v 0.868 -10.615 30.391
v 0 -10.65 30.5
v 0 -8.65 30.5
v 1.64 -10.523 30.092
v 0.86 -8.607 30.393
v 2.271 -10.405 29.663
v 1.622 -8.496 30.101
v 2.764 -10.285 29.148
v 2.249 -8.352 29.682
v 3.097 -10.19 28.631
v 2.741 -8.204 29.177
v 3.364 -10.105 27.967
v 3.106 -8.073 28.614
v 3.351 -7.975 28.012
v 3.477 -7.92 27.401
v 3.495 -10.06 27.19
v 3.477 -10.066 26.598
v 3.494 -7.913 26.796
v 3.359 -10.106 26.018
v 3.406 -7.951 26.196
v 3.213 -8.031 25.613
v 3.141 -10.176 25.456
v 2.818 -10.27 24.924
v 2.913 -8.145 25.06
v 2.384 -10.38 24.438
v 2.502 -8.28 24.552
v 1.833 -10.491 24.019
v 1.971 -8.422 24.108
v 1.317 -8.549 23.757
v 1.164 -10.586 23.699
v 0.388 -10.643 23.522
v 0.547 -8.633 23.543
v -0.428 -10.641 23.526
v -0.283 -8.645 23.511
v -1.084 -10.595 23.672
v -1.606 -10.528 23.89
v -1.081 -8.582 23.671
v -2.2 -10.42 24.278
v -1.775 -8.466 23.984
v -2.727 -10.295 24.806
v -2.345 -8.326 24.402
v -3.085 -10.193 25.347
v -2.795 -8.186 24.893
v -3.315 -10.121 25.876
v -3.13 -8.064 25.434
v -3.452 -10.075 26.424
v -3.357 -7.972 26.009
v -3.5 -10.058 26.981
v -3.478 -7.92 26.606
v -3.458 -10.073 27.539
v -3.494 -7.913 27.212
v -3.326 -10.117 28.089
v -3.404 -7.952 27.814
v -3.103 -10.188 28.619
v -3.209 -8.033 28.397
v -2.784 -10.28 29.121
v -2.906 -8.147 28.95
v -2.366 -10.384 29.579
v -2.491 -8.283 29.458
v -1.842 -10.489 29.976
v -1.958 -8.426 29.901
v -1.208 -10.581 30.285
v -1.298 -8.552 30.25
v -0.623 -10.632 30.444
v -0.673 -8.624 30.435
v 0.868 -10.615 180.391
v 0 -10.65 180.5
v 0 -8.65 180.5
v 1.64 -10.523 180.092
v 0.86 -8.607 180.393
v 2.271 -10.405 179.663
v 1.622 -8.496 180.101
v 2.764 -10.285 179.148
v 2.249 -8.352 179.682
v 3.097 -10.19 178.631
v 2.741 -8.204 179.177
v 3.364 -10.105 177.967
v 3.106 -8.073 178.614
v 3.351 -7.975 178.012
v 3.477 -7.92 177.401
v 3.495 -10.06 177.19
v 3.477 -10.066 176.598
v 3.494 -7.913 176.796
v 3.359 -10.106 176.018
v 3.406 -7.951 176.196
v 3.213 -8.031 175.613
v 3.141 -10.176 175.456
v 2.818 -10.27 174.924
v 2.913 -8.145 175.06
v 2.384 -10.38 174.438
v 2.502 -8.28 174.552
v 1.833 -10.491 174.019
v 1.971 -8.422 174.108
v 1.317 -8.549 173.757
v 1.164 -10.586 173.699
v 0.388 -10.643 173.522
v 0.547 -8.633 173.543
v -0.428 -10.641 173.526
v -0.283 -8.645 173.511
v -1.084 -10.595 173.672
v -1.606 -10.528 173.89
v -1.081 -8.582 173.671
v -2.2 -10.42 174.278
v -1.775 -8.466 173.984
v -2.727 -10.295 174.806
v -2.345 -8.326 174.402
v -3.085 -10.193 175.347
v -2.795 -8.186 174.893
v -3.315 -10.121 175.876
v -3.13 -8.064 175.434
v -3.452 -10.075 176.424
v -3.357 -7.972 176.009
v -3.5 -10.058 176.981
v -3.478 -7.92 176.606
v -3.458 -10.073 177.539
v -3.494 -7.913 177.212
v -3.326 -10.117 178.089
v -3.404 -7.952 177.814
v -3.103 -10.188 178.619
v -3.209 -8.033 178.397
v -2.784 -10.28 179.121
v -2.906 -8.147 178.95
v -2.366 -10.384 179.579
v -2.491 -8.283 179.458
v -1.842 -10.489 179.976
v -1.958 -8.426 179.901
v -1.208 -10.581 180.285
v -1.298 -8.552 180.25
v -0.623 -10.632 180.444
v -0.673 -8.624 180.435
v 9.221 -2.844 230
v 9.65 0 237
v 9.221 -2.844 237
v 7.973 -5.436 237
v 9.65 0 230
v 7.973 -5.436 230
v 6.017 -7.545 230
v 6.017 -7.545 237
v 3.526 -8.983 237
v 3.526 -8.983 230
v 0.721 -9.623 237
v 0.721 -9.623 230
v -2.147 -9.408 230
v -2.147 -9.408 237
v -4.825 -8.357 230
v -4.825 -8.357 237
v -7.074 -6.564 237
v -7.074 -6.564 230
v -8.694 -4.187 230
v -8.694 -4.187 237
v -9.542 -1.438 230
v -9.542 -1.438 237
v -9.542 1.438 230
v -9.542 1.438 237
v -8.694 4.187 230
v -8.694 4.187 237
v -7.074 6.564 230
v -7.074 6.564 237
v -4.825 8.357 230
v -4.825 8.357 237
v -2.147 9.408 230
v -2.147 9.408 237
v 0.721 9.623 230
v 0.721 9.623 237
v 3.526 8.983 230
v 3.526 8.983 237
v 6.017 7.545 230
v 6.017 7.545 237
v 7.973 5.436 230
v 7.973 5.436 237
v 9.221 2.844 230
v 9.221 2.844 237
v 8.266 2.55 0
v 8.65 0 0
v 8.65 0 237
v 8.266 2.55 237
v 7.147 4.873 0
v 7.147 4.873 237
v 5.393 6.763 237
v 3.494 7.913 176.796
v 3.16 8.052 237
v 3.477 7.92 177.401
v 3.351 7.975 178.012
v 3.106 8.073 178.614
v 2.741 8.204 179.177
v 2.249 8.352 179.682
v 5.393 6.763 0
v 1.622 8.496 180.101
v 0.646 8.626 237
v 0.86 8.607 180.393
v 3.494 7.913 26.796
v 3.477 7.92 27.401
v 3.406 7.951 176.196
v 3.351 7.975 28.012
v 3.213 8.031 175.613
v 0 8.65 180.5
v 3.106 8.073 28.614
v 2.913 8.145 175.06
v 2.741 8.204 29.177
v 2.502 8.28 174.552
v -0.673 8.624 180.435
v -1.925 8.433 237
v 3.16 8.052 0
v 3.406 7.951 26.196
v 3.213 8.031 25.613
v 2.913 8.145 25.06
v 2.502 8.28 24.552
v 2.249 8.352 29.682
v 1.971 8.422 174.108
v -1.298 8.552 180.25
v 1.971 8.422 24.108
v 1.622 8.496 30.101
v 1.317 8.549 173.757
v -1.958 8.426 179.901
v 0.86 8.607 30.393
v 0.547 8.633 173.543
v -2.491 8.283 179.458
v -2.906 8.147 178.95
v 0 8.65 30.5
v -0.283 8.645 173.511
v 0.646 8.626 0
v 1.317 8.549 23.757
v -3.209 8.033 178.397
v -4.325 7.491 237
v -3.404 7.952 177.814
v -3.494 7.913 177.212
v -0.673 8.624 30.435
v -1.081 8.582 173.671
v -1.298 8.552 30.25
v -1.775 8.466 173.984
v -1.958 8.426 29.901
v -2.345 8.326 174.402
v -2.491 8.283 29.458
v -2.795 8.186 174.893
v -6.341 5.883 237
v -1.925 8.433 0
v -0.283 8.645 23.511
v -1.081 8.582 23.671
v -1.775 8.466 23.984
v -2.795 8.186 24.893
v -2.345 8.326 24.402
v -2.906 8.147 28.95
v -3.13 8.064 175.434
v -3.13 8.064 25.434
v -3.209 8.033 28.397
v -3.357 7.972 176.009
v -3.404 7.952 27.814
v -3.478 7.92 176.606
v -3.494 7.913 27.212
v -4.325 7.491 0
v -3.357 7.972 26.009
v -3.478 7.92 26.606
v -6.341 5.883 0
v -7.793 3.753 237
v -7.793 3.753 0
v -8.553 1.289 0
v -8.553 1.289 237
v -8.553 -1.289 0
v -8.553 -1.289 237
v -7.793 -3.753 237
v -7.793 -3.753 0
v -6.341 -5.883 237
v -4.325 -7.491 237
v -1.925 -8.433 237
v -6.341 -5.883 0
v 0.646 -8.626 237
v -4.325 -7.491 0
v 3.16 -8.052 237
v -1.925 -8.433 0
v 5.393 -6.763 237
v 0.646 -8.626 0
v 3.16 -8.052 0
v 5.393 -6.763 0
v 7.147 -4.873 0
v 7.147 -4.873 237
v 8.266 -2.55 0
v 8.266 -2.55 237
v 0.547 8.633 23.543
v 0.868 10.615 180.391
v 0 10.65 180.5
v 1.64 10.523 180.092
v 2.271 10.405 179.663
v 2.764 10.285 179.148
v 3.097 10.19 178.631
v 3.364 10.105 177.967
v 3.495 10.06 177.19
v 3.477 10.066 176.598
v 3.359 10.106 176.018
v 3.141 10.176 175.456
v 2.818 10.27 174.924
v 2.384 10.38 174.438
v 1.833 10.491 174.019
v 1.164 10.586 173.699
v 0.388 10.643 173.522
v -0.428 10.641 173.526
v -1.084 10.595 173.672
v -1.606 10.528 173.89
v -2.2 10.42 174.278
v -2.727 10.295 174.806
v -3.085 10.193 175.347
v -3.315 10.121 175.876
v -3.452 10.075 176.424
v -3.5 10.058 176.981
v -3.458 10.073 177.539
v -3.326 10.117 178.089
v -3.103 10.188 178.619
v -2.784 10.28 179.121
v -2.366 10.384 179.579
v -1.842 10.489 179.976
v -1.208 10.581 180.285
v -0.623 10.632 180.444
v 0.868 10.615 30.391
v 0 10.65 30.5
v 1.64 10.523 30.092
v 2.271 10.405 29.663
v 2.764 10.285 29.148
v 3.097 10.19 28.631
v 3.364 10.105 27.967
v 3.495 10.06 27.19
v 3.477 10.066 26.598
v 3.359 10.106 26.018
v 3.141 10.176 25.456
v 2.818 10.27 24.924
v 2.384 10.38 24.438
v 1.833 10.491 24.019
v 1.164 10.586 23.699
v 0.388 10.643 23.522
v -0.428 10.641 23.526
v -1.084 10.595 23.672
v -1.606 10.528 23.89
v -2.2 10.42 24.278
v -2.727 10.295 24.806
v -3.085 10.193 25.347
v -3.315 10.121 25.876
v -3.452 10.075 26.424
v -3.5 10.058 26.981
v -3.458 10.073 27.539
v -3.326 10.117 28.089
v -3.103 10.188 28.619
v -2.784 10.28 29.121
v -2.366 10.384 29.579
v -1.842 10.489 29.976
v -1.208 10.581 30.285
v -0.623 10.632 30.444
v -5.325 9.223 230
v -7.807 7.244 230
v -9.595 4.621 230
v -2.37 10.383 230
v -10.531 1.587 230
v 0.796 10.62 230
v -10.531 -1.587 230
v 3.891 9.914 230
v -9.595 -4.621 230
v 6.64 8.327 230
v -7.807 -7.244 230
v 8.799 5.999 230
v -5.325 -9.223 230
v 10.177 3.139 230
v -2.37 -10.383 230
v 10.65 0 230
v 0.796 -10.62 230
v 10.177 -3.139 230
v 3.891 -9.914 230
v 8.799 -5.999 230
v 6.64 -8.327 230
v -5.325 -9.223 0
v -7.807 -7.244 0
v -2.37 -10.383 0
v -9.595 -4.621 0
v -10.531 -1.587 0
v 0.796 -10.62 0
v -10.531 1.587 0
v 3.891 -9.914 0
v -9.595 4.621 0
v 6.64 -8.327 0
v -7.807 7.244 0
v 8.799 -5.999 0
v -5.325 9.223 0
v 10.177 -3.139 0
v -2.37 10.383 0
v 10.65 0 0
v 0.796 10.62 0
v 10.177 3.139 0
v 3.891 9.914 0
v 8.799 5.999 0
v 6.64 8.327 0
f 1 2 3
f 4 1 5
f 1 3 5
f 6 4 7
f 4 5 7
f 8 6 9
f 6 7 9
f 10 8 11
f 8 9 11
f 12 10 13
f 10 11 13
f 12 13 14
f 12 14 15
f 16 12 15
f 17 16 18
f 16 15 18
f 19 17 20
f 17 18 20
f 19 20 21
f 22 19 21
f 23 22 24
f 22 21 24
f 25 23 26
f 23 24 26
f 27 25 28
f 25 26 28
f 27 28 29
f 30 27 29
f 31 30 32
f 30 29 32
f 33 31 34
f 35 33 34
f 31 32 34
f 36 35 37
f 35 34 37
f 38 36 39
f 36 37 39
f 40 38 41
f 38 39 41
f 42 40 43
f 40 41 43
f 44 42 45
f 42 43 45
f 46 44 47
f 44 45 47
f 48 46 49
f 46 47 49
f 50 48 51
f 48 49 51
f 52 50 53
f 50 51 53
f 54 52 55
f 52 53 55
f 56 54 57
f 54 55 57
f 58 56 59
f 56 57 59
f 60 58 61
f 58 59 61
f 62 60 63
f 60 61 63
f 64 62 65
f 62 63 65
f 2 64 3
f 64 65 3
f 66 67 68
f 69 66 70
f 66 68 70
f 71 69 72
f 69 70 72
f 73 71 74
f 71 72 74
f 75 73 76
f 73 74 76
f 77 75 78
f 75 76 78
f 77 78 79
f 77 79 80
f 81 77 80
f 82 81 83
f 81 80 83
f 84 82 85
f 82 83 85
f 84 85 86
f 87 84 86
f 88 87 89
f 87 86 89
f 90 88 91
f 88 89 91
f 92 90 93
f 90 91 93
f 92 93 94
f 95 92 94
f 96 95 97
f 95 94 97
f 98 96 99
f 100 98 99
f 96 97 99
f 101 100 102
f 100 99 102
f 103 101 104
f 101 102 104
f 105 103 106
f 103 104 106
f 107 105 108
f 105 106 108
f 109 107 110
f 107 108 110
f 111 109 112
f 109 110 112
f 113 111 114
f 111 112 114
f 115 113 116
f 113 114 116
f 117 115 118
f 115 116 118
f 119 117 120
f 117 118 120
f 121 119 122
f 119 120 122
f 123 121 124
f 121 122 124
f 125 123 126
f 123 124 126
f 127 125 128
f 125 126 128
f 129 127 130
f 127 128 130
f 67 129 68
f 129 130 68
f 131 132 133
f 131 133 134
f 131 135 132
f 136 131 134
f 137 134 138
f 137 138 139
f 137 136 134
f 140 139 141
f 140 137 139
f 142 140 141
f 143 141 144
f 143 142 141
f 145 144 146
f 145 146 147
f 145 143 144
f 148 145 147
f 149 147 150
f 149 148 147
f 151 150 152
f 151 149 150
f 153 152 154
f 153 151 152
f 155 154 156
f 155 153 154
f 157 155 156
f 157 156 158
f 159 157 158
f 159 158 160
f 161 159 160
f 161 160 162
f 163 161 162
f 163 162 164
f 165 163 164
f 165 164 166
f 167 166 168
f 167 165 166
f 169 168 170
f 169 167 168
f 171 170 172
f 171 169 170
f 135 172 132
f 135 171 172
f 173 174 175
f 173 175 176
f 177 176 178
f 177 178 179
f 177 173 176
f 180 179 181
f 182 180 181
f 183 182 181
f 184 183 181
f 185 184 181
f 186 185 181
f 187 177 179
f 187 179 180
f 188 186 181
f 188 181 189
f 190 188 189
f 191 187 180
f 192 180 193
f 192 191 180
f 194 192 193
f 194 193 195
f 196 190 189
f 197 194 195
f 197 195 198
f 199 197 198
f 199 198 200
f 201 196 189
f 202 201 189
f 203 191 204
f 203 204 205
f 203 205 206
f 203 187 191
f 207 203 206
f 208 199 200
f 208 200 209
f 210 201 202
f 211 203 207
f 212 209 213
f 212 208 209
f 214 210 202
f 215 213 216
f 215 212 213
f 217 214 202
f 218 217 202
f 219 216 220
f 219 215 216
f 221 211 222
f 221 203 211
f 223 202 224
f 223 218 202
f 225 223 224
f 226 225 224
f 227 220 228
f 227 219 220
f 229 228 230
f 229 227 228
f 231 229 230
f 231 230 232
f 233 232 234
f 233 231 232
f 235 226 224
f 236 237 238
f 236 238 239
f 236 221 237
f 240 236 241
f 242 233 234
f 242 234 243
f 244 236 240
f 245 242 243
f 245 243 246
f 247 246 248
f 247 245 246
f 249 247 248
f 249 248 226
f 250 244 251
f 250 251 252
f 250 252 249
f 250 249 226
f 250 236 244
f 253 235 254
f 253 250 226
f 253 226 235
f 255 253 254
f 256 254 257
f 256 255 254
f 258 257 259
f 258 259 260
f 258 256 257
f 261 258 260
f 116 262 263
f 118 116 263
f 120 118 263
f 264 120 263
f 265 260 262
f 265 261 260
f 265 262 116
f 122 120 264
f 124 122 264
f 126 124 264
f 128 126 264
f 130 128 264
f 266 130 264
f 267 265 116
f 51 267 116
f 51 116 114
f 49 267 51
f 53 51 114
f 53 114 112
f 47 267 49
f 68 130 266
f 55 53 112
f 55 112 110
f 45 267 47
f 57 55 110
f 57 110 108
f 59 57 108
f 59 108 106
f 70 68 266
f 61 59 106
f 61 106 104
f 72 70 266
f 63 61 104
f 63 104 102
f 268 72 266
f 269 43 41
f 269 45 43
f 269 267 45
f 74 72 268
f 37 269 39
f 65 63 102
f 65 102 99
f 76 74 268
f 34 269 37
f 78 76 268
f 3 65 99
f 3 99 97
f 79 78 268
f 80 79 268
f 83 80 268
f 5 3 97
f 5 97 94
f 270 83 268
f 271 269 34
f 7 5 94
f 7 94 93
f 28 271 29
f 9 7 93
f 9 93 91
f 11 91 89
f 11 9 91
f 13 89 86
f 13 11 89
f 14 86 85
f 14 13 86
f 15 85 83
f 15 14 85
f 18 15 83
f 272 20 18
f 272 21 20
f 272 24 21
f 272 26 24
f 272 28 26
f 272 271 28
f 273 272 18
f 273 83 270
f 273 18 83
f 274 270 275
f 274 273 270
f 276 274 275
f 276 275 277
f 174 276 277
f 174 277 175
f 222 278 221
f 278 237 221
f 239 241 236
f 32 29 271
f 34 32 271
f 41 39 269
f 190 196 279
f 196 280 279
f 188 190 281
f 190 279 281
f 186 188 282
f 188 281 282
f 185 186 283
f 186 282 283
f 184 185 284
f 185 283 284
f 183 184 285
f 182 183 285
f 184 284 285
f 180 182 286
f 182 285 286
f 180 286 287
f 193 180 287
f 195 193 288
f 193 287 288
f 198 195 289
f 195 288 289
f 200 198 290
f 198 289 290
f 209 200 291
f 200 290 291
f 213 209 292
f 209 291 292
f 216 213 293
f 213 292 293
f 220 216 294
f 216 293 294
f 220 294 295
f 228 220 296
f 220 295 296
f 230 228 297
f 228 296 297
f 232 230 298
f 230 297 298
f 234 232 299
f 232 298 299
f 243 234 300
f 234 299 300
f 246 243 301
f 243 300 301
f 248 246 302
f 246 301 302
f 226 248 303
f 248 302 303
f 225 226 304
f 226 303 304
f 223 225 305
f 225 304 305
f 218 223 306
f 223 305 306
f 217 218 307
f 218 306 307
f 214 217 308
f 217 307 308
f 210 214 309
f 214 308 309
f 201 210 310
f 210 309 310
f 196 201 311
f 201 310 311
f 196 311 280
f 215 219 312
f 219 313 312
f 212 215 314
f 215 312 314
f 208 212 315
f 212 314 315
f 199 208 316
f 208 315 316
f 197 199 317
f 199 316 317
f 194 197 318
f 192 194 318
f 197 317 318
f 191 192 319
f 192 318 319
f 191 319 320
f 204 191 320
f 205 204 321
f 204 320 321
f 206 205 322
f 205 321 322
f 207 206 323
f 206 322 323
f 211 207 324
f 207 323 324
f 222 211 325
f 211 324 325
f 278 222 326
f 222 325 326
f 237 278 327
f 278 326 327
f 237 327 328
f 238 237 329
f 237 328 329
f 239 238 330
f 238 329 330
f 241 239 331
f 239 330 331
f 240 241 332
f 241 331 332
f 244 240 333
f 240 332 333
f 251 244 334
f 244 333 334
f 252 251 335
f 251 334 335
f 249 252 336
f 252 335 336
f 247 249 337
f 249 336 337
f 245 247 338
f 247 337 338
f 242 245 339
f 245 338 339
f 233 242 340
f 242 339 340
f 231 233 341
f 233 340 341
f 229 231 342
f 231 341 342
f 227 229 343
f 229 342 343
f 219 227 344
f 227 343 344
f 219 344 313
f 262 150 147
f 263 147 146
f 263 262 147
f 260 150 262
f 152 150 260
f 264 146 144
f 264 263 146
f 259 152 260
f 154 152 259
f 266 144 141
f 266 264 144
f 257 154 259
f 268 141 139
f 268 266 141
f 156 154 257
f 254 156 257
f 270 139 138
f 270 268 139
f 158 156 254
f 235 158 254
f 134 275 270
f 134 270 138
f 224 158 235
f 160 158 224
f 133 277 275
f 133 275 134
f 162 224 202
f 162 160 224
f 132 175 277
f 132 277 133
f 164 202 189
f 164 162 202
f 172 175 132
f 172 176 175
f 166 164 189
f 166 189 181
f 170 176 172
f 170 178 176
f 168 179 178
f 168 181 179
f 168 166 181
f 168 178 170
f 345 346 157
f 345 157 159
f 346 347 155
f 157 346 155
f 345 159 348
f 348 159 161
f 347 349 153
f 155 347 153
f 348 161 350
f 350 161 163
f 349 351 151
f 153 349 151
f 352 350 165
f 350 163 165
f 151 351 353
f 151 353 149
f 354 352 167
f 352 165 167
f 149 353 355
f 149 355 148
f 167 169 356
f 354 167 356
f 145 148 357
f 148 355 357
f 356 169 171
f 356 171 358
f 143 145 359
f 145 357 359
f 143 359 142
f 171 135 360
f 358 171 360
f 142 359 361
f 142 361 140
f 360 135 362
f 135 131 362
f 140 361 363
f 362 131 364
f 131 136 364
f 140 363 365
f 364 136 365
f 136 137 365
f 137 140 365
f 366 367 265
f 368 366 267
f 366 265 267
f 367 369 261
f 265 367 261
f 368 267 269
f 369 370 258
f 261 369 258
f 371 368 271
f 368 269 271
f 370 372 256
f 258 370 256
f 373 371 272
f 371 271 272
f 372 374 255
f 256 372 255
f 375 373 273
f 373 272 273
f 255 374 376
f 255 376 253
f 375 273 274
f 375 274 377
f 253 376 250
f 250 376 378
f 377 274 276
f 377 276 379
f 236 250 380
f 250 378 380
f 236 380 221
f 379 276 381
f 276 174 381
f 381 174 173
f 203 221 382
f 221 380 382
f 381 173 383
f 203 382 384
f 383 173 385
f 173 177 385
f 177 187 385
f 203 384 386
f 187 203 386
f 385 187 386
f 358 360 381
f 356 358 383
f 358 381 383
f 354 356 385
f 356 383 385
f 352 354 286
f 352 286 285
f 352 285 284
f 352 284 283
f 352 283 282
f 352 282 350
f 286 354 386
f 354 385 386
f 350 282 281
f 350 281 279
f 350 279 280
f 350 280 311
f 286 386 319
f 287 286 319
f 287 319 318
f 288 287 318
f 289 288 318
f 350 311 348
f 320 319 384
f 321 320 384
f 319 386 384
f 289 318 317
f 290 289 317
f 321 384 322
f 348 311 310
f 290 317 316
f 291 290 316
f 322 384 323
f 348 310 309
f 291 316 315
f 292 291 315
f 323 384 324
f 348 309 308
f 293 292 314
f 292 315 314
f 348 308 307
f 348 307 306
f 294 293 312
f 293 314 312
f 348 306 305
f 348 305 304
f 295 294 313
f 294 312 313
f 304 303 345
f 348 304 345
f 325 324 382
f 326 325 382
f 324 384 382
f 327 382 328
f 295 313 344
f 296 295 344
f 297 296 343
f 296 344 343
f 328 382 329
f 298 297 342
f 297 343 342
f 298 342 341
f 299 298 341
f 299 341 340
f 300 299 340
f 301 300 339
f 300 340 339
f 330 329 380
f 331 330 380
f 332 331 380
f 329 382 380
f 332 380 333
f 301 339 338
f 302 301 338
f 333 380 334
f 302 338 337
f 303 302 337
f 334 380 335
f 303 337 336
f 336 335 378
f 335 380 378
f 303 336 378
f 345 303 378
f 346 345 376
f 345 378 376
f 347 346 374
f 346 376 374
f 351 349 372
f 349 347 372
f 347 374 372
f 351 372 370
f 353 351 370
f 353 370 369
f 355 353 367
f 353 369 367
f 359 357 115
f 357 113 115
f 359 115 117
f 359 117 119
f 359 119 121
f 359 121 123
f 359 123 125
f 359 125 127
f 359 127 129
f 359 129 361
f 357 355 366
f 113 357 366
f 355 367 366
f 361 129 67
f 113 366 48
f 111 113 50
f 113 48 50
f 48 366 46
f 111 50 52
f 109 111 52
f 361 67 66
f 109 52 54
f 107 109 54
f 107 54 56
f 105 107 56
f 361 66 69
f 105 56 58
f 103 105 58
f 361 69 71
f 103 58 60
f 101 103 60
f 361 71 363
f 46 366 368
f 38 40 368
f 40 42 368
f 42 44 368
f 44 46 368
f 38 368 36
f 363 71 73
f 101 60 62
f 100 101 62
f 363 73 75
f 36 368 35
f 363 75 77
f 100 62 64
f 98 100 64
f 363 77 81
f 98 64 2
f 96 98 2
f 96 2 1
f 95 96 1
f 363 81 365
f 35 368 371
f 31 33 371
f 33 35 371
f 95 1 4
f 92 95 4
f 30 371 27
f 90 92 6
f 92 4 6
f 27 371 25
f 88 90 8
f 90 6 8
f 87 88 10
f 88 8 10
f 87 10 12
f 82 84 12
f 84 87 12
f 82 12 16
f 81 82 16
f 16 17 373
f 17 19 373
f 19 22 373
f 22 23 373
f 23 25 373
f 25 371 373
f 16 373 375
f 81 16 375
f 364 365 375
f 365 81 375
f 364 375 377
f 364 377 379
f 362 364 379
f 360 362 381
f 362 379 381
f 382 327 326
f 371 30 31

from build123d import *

# Parameters (mm, degrees)
SKETCH1_R           = 10.65
SKETCH1_R_2         = 8.65
BOSS_EXTRUDE1_DEPTH = 237
SKETCH2_R           = 3.5
CUT_EXTRUDE1_DEPTH  = 238.478093727
LPATTERN1_COUNT     = 2
LPATTERN1_PITCH     = 150
SKETCH3_W           = 1
SKETCH3_H           = 7


with BuildPart() as part:
    # Sketch1 → Boss-Extrude1 (new body)
    with BuildSketch(Plane.XY):
        Circle(SKETCH1_R)
        Circle(SKETCH1_R_2, mode=Mode.SUBTRACT)
    extrude(amount=BOSS_EXTRUDE1_DEPTH)

    # Sketch2 → Cut-Extrude1 (cut, symmetric)
    with BuildSketch(Plane(origin=(0, 0, 0), x_dir=(1, 0, 0), z_dir=(0, 1, 0))):
        with Locations(Location((0, -177, 0), (0, 0, 270))):
            Circle(SKETCH2_R)
    cut_extrude1 = extrude(amount=CUT_EXTRUDE1_DEPTH, both=True, mode=Mode.SUBTRACT)

    # LPattern1: Cut-Extrude1 ×2
    with Locations(*[(0, 0, -i * LPATTERN1_PITCH) for i in range(1, LPATTERN1_COUNT)]):
        add(cut_extrude1, mode=Mode.SUBTRACT)

    # Sketch3 → Cut-Revolve1 (revolve, cut)
    with BuildSketch(Plane(origin=(0, 0, 0), x_dir=(1, 0, 0), z_dir=(0, 1, 0)), mode=Mode.PRIVATE) as cut_revolve1_sk:
        with Locations((-10.15, -233.5)):
            Rectangle(SKETCH3_W, SKETCH3_H)
    revolve(cut_revolve1_sk.sketch.rotate(Axis((0, 0, 237), (0, 0, -1)), 180), axis=Axis((0, 0, 237), (0, 0, -1)), mode=Mode.SUBTRACT)


solid = part.part
